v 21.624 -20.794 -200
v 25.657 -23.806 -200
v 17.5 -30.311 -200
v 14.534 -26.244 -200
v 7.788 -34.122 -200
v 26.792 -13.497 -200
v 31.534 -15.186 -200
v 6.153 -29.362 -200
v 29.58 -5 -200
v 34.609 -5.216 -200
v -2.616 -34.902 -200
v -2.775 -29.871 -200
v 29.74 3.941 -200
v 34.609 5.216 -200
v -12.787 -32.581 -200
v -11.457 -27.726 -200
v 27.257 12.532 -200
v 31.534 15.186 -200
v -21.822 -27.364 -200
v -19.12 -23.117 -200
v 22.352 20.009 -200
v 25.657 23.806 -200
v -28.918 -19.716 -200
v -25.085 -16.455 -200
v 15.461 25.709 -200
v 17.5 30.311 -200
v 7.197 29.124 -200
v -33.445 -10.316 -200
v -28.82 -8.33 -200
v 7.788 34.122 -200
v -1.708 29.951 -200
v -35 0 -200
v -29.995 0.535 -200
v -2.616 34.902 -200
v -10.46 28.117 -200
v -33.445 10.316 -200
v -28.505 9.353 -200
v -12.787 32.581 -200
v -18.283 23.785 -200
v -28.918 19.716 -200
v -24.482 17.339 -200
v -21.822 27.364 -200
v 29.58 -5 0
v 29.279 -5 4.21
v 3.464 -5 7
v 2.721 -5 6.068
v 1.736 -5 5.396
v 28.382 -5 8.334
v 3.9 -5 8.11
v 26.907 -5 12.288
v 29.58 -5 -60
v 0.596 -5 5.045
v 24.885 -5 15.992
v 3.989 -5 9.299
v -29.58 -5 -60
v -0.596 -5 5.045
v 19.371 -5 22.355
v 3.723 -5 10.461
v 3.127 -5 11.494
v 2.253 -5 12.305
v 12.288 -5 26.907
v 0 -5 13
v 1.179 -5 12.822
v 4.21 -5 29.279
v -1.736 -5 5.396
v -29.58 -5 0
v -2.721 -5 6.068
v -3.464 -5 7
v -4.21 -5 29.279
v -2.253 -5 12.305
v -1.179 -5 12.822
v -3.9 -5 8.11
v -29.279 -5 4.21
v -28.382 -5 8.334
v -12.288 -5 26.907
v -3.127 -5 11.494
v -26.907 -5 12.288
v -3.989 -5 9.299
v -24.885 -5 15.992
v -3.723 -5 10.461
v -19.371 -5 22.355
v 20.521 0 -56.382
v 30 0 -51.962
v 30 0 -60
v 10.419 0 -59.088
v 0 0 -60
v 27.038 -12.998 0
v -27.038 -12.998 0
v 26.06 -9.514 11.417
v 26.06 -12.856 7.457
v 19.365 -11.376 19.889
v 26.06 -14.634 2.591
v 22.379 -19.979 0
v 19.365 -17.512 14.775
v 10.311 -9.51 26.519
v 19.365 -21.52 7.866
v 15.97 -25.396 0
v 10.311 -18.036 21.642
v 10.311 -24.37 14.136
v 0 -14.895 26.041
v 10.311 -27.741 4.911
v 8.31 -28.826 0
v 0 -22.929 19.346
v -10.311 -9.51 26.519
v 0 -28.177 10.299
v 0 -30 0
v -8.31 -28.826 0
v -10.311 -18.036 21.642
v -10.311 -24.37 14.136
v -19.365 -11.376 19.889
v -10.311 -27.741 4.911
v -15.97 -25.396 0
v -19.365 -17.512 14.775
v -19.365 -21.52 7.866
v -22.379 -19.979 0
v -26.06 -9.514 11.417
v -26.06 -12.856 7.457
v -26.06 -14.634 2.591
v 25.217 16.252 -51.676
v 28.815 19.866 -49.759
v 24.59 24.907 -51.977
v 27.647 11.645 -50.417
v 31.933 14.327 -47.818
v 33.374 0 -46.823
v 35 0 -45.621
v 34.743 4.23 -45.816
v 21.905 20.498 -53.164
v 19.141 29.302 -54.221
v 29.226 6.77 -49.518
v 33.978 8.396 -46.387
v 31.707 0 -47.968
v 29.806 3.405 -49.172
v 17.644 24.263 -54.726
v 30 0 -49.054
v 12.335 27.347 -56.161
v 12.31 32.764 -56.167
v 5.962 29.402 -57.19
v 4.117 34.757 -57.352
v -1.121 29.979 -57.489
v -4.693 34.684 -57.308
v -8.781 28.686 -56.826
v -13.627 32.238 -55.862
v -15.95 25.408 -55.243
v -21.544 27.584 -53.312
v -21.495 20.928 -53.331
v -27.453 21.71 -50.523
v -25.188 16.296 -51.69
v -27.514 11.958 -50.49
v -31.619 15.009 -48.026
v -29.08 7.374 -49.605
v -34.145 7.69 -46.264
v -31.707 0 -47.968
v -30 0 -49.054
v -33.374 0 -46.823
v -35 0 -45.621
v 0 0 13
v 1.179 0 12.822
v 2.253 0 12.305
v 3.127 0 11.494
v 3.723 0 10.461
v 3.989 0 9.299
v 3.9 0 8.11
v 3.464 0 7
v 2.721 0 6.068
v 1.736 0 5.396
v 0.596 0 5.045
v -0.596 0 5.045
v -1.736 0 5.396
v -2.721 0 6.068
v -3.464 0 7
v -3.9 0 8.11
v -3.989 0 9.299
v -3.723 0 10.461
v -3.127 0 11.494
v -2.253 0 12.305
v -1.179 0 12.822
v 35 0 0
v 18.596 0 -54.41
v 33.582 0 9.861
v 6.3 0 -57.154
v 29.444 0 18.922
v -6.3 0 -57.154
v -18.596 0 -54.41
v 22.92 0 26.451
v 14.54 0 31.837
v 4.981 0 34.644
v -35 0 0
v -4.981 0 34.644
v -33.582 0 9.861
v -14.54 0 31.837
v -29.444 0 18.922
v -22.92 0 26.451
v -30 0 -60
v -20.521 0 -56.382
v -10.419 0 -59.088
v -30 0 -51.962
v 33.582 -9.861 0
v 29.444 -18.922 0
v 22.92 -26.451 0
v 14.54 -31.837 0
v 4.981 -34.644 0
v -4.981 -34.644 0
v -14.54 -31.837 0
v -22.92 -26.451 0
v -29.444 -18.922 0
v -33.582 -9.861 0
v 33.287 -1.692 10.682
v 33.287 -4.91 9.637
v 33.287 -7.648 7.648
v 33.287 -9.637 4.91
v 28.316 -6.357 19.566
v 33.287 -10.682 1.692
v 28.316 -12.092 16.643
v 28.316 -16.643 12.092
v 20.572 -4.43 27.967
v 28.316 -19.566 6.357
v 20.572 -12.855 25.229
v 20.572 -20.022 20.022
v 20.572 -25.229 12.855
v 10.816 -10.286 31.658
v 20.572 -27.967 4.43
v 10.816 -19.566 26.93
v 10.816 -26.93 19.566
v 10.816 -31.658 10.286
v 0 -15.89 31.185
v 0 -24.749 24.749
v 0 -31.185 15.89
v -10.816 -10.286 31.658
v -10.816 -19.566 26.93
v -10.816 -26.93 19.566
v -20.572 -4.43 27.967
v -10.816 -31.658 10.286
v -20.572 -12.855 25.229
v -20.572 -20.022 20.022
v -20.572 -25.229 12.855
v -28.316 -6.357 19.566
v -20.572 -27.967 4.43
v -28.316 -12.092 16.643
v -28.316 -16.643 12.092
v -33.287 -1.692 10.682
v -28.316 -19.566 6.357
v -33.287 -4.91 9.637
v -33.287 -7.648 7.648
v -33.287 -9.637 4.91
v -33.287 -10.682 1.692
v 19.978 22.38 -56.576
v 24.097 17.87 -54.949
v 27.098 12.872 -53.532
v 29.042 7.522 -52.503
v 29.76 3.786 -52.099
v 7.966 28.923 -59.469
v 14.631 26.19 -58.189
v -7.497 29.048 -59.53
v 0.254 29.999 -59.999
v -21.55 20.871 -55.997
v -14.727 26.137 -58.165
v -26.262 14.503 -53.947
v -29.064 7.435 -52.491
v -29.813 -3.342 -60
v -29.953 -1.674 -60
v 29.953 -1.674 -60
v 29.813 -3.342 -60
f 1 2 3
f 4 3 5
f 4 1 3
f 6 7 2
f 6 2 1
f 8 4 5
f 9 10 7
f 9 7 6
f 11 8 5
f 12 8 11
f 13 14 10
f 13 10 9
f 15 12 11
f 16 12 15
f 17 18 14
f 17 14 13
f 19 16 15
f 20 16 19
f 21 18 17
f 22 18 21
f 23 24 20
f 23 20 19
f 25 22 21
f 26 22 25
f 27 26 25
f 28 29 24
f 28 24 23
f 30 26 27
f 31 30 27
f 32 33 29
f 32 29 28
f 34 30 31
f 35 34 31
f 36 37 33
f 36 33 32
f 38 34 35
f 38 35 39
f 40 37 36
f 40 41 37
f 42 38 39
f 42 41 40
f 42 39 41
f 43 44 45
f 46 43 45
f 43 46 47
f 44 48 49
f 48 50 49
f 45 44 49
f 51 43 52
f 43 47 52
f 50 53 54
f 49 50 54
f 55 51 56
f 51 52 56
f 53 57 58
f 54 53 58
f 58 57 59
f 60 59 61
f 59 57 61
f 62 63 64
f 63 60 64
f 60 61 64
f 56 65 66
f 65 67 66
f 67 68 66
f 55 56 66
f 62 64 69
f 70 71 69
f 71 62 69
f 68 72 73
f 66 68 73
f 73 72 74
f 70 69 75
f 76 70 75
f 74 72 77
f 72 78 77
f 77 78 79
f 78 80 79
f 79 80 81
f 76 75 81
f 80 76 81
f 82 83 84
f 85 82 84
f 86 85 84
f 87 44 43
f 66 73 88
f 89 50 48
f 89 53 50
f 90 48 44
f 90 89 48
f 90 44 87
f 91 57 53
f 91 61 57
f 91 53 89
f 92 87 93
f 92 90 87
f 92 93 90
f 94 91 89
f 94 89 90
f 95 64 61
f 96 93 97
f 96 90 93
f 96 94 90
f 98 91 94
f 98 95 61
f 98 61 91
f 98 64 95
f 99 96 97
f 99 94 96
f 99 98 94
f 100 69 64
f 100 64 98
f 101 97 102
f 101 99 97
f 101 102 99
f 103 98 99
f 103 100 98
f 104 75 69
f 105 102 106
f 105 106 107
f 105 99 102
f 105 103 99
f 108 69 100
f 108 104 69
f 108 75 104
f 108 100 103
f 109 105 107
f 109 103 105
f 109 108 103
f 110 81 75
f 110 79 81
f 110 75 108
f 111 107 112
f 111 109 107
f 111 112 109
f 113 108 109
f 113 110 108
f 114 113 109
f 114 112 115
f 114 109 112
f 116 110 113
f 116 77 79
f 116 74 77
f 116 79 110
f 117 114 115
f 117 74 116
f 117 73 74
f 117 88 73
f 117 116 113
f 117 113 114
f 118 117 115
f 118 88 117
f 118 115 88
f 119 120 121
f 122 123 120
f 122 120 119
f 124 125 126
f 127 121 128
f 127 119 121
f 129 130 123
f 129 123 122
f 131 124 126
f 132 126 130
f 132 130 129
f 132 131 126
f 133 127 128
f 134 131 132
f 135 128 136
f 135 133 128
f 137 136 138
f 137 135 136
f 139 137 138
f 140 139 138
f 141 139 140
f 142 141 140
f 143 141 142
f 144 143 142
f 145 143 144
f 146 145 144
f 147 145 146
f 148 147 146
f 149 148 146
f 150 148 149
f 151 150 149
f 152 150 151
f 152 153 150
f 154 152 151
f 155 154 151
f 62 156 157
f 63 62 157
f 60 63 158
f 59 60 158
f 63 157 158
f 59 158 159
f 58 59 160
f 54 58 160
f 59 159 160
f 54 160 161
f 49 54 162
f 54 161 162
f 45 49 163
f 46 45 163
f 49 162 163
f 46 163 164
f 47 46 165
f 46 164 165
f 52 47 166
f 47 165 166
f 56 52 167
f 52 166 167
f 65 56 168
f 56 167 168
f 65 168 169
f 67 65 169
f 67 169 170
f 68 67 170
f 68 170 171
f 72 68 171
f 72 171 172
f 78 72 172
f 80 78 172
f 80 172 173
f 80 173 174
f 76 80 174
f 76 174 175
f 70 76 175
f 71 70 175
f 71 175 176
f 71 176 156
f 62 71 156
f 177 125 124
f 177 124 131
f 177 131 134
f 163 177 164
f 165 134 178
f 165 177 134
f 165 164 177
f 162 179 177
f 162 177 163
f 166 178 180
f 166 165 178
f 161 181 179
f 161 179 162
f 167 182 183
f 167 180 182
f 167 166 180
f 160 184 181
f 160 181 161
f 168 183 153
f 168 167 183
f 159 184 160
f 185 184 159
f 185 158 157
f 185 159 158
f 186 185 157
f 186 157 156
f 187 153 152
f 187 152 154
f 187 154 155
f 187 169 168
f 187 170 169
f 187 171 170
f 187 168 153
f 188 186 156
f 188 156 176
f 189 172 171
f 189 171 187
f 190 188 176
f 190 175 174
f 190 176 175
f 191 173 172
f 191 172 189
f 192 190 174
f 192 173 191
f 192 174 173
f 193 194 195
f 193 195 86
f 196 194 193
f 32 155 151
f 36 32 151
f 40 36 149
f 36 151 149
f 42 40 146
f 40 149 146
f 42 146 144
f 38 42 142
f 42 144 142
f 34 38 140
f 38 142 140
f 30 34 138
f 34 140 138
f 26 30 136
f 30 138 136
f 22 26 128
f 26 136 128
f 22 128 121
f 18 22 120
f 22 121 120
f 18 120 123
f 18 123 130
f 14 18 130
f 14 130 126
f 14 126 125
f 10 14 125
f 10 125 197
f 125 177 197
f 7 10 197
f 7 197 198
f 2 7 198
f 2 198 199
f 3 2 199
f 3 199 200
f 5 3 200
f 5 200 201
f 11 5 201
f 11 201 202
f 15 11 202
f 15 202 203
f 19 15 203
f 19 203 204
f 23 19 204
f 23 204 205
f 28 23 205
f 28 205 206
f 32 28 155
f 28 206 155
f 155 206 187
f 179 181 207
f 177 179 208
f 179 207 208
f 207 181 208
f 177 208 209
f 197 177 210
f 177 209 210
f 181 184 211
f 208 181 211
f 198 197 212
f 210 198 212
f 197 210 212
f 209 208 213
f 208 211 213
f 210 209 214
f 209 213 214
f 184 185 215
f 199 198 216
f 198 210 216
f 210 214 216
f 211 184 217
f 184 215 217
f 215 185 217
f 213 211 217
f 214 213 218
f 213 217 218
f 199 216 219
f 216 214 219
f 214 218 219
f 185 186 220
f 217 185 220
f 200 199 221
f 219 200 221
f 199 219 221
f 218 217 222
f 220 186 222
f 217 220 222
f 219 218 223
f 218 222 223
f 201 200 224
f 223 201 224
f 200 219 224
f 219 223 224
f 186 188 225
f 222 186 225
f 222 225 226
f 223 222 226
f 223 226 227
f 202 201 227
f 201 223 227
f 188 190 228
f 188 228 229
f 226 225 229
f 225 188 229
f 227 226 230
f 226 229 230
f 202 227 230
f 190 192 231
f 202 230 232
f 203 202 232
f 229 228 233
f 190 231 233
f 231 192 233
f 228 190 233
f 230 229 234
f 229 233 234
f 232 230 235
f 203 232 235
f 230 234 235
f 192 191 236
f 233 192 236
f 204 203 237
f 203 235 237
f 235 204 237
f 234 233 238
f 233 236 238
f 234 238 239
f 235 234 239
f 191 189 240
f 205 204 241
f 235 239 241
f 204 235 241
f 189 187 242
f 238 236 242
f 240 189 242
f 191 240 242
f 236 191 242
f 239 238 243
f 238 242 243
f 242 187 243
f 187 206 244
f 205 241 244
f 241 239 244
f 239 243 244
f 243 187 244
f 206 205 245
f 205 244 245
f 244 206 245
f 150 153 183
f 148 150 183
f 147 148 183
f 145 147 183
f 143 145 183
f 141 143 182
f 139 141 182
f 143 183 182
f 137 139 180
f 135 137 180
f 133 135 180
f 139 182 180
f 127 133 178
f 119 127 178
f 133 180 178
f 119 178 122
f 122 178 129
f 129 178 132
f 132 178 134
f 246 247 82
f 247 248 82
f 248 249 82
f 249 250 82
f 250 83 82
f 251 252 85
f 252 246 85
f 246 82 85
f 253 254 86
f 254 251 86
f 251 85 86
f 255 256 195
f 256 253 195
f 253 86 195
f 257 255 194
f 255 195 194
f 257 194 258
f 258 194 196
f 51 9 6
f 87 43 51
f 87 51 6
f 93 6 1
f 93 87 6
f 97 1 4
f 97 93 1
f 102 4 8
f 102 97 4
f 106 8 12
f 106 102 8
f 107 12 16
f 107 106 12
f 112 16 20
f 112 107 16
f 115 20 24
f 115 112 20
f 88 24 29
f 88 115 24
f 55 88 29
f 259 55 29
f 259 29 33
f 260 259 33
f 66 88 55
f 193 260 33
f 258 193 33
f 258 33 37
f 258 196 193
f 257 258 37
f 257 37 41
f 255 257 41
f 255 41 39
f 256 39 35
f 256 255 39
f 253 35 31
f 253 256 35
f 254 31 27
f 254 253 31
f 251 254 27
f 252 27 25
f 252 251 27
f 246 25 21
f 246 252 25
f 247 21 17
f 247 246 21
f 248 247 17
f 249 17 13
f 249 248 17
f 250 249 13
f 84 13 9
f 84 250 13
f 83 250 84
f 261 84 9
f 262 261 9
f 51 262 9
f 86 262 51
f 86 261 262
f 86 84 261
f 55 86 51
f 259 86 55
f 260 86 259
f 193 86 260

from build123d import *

# Parameters (mm, degrees)
REVOLVE1_ANGLE      = 90
SHELL2_T            = -5
SKETCH3_R           = 4
CUT_EXTRUDE1_DEPTH  = 7
SKETCH4_R           = 35
SKETCH4_R_2         = 30
BOSS_EXTRUDE1_DEPTH = 200
BOSS_EXTRUDE3_REACH = 208.034
CUT_EXTRUDE3_DEPTH  = 80
SKETCH6_W           = 60
SKETCH6_H           = 5
BOSS_EXTRUDE4_DEPTH = 60
CUT_EXTRUDE4_DEPTH  = 113
BOSS_EXTRUDE5_REACH = 208.034


with BuildPart() as part:
    # Sketch1 → Revolve1 (revolve)
    with BuildSketch(Plane(origin=(0, 0, 0), x_dir=(1, 0, 0), z_dir=(0, 1, 0))):
        with BuildLine():
            Line((-35, 0), (35, 0))
            ThreePointArc((35, 0), (0, -35), (-35, 0))
        make_face()
    revolve(axis=Axis((-35, 0, 0), (1, 0, 0)), revolution_arc=REVOLVE1_ANGLE)

    # Shell2
    shell2_openings = [part.faces().sort_by_distance(p)[0] for p in [
        (0, -14.854461355, 0),
    ]]
    offset(amount=SHELL2_T, openings=shell2_openings, kind=Kind.INTERSECTION)

    # Sketch3 → Cut-Extrude1 (cut)
    with BuildSketch(Plane(origin=(0, 0, 0), x_dir=(1, 0, 0), z_dir=(0, 1, 0))):
        with Locations(Location((0, -9, 0), (0, 0, 270))):
            Circle(SKETCH3_R)
    extrude(amount=-CUT_EXTRUDE1_DEPTH, mode=Mode.SUBTRACT)

    # Sketch4 → Boss-Extrude1 (add)
    with BuildSketch(Plane(origin=(0, 0, 0), x_dir=(-1, 0, 0), z_dir=(0, 0, -1))):
        Circle(SKETCH4_R)
        with Locations(Location((0, 0, 0), (0, 0, 189.594068227))):
            Circle(SKETCH4_R_2, mode=Mode.SUBTRACT)
    extrude(amount=BOSS_EXTRUDE1_DEPTH)

    # Sketch5 → Boss-Extrude3 (add, up to next)
    with BuildSketch(Plane(origin=(0, 0, 0), x_dir=(1, 0, 0), z_dir=(0, 1, 0)), mode=Mode.PRIVATE) as boss_extrude3_sk1:
        with BuildLine():
            ThreePointArc((-30, 0), (0, 30), (30, 0))
            Line((30, 0), (35, 0))
            ThreePointArc((35, 0), (0, 35), (-35, 0))
            Line((-35, 0), (-30, 0))
        make_face()
    boss_extrude3_tool1 = extrude(boss_extrude3_sk1.sketch, amount=BOSS_EXTRUDE3_REACH, mode=Mode.PRIVATE) - part.part
    add(boss_extrude3_tool1.solids().sort_by_distance((-32.5, 0, -0.782624))[0])

    # Sketch5<5> → Cut-Extrude3 (cut)
    with BuildSketch(Plane(origin=(0, 0, 0), x_dir=(1, 0, 0), z_dir=(0, 1, 0))):
        with BuildLine():
            ThreePointArc((30, 0), (0, 30), (-30, 0))
            Line((-30, 0), (30, 0))
        make_face()
        with BuildLine():
            Line((30, 0), (-30, 0))
            ThreePointArc((-30, 0), (0, -30), (30, 0))
        make_face()
    extrude(amount=CUT_EXTRUDE3_DEPTH, mode=Mode.SUBTRACT)

    # Sketch6 → Boss-Extrude4 (add)
    with BuildSketch(Plane(origin=(0, 0, 0), x_dir=(-1, 0, 0), z_dir=(0, 0, -1))):
        with Locations((0, -2.5)):
            Rectangle(SKETCH6_W, SKETCH6_H)
    extrude(amount=BOSS_EXTRUDE4_DEPTH)

    # Sketch5<7> → Cut-Extrude4 (cut)
    with BuildSketch(Plane(origin=(0, 0, 0), x_dir=(1, 0, 0), z_dir=(0, 1, 0))):
        with BuildLine():
            ThreePointArc((35, 0), (0, 35), (-35, 0))
            Line((-35, 0), (-30, 0))
            ThreePointArc((-30, 0), (0, 30), (30, 0))
            Line((30, 0), (35, 0))
        make_face()
        with BuildLine():
            Line((-30, 0), (-35, 0))
            ThreePointArc((-35, 0), (0, -35), (35, 0))
            Line((35, 0), (30, 0))
            ThreePointArc((30, 0), (0, -30), (-30, 0))
        make_face()
        with BuildLine():
            Line((-35, 45.620718977), (-35, 0))
            ThreePointArc((-35, 0), (0, 35), (35, 0))
            Line((35, 0), (35, 45.620718977))
            Line((35, 45.620718977), (-35, 45.620718977))
        make_face()
        with BuildLine():
            ThreePointArc((35, 45.620718977), (0, 57.5), (-35, 45.620718977))
            Line((-35, 45.620718977), (35, 45.620718977))
        make_face()
    extrude(amount=CUT_EXTRUDE4_DEPTH, mode=Mode.SUBTRACT)

    # Sketch5<9> → Boss-Extrude5 (add, up to next)
    with BuildSketch(Plane(origin=(0, 0, 0), x_dir=(1, 0, 0), z_dir=(0, 1, 0)), mode=Mode.PRIVATE) as boss_extrude5_sk1:
        with BuildLine():
            ThreePointArc((-35, 45.620718977), (0, 57.5), (35, 45.620718977))
            Line((35, 45.620718977), (35, 48.733971724))
            ThreePointArc((35, 48.733971724), (0, 60), (-35, 48.733971724))
            Line((-35, 48.733971724), (-35, 45.620718977))
        make_face()
    boss_extrude5_tool1 = extrude(boss_extrude5_sk1.sketch, amount=BOSS_EXTRUDE5_REACH, mode=Mode.PRIVATE) - part.part
    add(boss_extrude5_tool1.solids().sort_by_distance((0, 0, -59.285384))[0])


solid = part.part
